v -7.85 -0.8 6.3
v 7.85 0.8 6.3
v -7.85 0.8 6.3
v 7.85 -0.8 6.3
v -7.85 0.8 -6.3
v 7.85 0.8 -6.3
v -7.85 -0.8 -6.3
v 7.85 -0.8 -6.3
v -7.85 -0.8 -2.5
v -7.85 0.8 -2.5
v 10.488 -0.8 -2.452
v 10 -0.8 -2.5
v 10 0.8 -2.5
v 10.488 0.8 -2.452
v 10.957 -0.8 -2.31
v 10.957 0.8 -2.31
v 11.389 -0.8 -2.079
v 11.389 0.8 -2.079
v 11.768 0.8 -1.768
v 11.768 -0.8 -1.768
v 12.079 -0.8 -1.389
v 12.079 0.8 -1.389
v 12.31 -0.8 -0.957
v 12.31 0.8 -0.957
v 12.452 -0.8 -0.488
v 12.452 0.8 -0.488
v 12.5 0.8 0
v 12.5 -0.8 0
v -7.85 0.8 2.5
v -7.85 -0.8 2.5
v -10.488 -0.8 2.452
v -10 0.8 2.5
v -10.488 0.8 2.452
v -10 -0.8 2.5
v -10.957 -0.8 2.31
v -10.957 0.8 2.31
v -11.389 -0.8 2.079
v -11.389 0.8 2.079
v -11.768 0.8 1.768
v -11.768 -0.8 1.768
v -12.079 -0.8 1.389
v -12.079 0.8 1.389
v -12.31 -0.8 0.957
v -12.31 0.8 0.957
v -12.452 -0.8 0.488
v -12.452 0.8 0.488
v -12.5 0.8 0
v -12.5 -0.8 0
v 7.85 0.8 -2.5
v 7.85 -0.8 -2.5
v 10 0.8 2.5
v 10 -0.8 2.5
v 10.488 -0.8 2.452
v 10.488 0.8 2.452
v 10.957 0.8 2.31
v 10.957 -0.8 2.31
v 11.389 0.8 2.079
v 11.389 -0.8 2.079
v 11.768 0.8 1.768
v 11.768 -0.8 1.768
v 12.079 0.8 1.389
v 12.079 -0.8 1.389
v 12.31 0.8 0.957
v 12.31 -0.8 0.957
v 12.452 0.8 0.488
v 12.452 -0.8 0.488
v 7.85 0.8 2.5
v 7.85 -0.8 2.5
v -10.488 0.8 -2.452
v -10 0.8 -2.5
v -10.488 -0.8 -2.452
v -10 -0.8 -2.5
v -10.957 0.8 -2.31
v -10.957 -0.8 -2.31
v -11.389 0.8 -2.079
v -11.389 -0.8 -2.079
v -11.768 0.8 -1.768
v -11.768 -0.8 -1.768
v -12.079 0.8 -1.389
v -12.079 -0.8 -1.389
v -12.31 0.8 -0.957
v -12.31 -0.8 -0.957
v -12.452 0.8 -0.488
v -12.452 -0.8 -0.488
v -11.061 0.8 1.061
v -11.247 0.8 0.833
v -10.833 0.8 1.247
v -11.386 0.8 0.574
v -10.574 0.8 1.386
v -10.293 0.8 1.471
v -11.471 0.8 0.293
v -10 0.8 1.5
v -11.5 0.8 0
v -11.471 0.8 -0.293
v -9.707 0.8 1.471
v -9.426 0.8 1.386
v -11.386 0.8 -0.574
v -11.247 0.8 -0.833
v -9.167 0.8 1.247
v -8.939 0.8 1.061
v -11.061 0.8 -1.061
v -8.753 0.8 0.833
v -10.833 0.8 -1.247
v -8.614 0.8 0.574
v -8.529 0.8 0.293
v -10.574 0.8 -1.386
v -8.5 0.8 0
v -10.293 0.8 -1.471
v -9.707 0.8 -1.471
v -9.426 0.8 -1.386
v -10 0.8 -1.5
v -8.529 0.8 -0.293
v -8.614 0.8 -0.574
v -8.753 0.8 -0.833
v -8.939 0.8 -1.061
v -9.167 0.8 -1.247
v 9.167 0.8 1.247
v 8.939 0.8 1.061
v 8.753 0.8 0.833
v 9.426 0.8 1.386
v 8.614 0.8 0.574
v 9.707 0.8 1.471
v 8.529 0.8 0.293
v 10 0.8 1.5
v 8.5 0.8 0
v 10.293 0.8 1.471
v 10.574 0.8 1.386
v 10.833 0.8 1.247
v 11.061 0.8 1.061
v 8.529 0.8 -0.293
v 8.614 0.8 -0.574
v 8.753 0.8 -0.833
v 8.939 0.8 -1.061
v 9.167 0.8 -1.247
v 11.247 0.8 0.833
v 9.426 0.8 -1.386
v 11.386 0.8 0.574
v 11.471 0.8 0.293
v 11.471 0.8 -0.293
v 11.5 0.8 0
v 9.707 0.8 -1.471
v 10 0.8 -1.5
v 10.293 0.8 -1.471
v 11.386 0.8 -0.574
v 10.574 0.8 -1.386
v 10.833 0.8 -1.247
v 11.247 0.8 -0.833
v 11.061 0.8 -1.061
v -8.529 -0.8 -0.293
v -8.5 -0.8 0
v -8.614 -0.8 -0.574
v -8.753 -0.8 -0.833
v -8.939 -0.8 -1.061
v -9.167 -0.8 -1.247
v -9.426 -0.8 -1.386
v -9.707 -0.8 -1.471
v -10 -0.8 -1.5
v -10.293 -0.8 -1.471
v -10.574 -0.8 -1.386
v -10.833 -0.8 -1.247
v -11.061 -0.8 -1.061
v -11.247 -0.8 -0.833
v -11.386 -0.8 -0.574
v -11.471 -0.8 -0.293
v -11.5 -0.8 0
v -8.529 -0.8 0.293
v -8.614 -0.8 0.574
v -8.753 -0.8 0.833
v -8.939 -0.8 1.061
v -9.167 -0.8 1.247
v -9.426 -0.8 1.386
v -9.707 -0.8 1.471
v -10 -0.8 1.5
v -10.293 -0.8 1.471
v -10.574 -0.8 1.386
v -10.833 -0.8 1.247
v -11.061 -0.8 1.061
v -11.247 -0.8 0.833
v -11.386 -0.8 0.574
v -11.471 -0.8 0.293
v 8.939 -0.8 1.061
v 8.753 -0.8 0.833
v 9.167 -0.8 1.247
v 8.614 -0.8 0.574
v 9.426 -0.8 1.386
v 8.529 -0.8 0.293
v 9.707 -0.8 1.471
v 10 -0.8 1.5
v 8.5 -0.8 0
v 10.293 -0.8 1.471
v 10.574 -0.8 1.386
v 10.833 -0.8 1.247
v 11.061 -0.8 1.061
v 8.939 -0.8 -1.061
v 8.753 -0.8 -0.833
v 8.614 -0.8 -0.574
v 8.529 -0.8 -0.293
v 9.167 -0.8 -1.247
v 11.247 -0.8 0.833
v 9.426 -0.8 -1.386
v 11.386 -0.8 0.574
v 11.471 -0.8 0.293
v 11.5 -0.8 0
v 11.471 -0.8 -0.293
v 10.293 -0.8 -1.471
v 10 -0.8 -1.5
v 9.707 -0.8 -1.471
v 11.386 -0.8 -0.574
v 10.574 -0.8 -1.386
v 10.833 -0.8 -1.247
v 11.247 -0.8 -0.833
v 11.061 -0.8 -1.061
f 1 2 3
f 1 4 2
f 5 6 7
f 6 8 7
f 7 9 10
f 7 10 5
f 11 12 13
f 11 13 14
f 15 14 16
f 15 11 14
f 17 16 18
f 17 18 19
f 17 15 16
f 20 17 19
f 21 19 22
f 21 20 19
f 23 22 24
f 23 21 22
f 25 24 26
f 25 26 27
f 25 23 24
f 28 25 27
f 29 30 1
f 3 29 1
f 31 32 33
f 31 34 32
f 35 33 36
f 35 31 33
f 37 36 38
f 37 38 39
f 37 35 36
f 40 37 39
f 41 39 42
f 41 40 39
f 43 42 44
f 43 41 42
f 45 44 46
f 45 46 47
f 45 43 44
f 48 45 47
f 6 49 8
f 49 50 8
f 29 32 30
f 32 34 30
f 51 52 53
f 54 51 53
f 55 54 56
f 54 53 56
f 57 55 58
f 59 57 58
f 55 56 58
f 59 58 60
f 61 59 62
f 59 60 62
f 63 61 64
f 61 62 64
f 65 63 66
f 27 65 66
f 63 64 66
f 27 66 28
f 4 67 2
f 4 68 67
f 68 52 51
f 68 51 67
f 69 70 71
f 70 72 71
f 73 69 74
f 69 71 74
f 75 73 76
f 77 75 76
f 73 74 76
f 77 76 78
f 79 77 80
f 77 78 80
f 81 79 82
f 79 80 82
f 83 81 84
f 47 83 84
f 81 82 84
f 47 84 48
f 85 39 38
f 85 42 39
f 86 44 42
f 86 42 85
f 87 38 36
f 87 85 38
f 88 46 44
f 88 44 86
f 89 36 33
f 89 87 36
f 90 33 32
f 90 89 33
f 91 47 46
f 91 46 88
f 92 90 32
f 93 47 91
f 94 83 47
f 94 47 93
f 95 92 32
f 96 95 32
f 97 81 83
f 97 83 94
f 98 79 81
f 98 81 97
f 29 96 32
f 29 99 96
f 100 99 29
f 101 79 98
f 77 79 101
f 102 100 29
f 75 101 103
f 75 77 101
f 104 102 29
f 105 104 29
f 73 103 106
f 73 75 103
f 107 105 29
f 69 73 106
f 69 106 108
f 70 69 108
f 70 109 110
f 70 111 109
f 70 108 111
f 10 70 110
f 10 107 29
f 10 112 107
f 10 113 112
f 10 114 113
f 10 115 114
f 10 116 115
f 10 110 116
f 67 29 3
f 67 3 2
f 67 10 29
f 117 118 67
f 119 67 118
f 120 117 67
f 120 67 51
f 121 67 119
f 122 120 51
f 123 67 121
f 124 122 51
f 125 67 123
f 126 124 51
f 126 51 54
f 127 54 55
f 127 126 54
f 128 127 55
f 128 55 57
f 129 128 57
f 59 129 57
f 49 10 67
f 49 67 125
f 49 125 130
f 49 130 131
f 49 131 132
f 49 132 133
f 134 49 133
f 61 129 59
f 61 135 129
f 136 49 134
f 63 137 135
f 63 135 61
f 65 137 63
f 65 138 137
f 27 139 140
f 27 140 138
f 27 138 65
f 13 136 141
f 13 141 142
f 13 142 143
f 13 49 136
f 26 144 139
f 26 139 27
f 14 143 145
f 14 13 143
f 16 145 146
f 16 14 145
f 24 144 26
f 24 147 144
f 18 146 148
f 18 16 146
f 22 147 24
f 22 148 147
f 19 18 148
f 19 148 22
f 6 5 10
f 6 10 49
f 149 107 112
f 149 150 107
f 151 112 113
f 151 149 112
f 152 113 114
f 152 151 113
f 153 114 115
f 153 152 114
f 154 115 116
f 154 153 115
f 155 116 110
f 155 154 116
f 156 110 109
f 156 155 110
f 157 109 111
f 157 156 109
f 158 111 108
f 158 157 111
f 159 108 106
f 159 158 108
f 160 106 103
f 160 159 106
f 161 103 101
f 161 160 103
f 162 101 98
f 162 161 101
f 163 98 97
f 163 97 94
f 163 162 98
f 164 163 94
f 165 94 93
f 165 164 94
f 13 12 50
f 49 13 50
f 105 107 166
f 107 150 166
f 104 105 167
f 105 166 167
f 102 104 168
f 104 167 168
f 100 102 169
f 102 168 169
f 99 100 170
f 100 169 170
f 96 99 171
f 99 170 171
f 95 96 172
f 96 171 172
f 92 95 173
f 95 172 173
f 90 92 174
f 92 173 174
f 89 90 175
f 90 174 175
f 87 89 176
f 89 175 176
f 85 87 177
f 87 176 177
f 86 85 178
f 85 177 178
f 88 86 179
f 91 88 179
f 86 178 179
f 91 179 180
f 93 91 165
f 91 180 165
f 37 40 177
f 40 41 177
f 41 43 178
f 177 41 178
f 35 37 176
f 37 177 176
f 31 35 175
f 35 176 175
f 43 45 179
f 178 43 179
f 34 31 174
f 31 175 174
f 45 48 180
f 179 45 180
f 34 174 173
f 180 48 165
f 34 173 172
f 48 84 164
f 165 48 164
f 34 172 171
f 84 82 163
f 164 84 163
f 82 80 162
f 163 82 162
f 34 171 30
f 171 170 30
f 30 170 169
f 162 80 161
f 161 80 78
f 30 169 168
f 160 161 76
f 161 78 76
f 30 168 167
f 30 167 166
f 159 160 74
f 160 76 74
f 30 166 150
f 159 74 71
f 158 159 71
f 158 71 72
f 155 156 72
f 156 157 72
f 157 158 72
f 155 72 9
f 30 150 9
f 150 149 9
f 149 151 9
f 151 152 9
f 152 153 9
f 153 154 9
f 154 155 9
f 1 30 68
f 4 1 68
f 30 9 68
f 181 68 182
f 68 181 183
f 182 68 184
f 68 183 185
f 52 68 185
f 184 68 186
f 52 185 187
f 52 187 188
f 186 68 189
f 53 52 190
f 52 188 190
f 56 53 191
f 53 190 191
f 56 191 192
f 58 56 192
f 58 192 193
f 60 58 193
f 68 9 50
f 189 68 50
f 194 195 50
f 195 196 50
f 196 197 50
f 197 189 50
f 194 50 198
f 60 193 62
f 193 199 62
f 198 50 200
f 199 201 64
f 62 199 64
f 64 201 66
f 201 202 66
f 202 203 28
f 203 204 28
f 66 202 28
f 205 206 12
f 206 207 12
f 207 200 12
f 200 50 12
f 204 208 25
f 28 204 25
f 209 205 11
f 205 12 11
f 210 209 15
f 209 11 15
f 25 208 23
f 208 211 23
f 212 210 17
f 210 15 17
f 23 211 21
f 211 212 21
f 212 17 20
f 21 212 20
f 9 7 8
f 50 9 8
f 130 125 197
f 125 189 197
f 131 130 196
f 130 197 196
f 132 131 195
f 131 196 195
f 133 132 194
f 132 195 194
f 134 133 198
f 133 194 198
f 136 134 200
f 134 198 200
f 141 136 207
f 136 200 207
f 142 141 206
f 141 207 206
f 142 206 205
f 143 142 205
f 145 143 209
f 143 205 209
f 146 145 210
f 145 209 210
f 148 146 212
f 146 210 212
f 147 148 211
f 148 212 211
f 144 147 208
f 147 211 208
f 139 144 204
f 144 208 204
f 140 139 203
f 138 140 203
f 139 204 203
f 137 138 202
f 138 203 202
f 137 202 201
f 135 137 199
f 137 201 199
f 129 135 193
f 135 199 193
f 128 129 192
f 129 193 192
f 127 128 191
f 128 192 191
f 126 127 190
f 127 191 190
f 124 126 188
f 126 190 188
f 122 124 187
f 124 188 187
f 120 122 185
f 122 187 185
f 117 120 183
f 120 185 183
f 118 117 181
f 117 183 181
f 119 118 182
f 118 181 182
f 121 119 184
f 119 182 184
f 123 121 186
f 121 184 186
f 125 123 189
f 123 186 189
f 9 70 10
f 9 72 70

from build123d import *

# Parameters (mm, degrees)
PAD007_DEPTH          = 0.8
PAD007_MIRROR_2_DEPTH = 0.8


with BuildPart() as part:
    # Sketch038 (on XZ_Plane013 of Origin026) → Pad007 (new body, symmetric)
    with BuildSketch(Plane.XZ):
        with BuildLine():
            Line((0, 6.3), (0, 0))
            Line((0, 0), (-8.5, 0))
            ThreePointArc((-8.5, 0), (-10, 1.5), (-11.5, 0))
            Line((-11.5, 0), (-12.5, 0))
            ThreePointArc((-10, 2.5), (-11.767767, 1.767767), (-12.5, 0))
            Line((-10, 2.5), (-7.85, 2.5))
            Line((-7.85, 2.5), (-7.85, 6.3))
            Line((-7.85, 6.3), (0, 6.3))
        make_face()
    pad007 = extrude(amount=PAD007_DEPTH, both=True)

    # Sketch038 Mirror 2 → Pad007 Mirror 2 (add, symmetric)
    with BuildSketch(Plane(origin=(0, 0, 0), x_dir=(-1, 0, 0), z_dir=(0, 1, 0))):
        with BuildLine():
            Line((0, 6.3), (0, 0))
            Line((0, 0), (-8.5, 0))
            ThreePointArc((-8.5, 0), (-10, 1.5), (-11.5, 0))
            Line((-11.5, 0), (-12.5, 0))
            ThreePointArc((-10, 2.5), (-11.767767, 1.767767), (-12.5, 0))
            Line((-10, 2.5), (-7.85, 2.5))
            Line((-7.85, 2.5), (-7.85, 6.3))
            Line((-7.85, 6.3), (0, 6.3))
        make_face()
    pad007_mirror_2 = extrude(amount=-PAD007_MIRROR_2_DEPTH, both=True)

    # Mirror001: Pad007, Pad007 Mirror 2 across Sketch038 H_Axis
    add(pad007.mirror(Plane(origin=(0, 0, 0), x_dir=(0, -1, 0), z_dir=(0, 0, 1))))
    add(pad007_mirror_2.mirror(Plane(origin=(0, 0, 0), x_dir=(0, -1, 0), z_dir=(0, 0, 1))))


solid = part.part
